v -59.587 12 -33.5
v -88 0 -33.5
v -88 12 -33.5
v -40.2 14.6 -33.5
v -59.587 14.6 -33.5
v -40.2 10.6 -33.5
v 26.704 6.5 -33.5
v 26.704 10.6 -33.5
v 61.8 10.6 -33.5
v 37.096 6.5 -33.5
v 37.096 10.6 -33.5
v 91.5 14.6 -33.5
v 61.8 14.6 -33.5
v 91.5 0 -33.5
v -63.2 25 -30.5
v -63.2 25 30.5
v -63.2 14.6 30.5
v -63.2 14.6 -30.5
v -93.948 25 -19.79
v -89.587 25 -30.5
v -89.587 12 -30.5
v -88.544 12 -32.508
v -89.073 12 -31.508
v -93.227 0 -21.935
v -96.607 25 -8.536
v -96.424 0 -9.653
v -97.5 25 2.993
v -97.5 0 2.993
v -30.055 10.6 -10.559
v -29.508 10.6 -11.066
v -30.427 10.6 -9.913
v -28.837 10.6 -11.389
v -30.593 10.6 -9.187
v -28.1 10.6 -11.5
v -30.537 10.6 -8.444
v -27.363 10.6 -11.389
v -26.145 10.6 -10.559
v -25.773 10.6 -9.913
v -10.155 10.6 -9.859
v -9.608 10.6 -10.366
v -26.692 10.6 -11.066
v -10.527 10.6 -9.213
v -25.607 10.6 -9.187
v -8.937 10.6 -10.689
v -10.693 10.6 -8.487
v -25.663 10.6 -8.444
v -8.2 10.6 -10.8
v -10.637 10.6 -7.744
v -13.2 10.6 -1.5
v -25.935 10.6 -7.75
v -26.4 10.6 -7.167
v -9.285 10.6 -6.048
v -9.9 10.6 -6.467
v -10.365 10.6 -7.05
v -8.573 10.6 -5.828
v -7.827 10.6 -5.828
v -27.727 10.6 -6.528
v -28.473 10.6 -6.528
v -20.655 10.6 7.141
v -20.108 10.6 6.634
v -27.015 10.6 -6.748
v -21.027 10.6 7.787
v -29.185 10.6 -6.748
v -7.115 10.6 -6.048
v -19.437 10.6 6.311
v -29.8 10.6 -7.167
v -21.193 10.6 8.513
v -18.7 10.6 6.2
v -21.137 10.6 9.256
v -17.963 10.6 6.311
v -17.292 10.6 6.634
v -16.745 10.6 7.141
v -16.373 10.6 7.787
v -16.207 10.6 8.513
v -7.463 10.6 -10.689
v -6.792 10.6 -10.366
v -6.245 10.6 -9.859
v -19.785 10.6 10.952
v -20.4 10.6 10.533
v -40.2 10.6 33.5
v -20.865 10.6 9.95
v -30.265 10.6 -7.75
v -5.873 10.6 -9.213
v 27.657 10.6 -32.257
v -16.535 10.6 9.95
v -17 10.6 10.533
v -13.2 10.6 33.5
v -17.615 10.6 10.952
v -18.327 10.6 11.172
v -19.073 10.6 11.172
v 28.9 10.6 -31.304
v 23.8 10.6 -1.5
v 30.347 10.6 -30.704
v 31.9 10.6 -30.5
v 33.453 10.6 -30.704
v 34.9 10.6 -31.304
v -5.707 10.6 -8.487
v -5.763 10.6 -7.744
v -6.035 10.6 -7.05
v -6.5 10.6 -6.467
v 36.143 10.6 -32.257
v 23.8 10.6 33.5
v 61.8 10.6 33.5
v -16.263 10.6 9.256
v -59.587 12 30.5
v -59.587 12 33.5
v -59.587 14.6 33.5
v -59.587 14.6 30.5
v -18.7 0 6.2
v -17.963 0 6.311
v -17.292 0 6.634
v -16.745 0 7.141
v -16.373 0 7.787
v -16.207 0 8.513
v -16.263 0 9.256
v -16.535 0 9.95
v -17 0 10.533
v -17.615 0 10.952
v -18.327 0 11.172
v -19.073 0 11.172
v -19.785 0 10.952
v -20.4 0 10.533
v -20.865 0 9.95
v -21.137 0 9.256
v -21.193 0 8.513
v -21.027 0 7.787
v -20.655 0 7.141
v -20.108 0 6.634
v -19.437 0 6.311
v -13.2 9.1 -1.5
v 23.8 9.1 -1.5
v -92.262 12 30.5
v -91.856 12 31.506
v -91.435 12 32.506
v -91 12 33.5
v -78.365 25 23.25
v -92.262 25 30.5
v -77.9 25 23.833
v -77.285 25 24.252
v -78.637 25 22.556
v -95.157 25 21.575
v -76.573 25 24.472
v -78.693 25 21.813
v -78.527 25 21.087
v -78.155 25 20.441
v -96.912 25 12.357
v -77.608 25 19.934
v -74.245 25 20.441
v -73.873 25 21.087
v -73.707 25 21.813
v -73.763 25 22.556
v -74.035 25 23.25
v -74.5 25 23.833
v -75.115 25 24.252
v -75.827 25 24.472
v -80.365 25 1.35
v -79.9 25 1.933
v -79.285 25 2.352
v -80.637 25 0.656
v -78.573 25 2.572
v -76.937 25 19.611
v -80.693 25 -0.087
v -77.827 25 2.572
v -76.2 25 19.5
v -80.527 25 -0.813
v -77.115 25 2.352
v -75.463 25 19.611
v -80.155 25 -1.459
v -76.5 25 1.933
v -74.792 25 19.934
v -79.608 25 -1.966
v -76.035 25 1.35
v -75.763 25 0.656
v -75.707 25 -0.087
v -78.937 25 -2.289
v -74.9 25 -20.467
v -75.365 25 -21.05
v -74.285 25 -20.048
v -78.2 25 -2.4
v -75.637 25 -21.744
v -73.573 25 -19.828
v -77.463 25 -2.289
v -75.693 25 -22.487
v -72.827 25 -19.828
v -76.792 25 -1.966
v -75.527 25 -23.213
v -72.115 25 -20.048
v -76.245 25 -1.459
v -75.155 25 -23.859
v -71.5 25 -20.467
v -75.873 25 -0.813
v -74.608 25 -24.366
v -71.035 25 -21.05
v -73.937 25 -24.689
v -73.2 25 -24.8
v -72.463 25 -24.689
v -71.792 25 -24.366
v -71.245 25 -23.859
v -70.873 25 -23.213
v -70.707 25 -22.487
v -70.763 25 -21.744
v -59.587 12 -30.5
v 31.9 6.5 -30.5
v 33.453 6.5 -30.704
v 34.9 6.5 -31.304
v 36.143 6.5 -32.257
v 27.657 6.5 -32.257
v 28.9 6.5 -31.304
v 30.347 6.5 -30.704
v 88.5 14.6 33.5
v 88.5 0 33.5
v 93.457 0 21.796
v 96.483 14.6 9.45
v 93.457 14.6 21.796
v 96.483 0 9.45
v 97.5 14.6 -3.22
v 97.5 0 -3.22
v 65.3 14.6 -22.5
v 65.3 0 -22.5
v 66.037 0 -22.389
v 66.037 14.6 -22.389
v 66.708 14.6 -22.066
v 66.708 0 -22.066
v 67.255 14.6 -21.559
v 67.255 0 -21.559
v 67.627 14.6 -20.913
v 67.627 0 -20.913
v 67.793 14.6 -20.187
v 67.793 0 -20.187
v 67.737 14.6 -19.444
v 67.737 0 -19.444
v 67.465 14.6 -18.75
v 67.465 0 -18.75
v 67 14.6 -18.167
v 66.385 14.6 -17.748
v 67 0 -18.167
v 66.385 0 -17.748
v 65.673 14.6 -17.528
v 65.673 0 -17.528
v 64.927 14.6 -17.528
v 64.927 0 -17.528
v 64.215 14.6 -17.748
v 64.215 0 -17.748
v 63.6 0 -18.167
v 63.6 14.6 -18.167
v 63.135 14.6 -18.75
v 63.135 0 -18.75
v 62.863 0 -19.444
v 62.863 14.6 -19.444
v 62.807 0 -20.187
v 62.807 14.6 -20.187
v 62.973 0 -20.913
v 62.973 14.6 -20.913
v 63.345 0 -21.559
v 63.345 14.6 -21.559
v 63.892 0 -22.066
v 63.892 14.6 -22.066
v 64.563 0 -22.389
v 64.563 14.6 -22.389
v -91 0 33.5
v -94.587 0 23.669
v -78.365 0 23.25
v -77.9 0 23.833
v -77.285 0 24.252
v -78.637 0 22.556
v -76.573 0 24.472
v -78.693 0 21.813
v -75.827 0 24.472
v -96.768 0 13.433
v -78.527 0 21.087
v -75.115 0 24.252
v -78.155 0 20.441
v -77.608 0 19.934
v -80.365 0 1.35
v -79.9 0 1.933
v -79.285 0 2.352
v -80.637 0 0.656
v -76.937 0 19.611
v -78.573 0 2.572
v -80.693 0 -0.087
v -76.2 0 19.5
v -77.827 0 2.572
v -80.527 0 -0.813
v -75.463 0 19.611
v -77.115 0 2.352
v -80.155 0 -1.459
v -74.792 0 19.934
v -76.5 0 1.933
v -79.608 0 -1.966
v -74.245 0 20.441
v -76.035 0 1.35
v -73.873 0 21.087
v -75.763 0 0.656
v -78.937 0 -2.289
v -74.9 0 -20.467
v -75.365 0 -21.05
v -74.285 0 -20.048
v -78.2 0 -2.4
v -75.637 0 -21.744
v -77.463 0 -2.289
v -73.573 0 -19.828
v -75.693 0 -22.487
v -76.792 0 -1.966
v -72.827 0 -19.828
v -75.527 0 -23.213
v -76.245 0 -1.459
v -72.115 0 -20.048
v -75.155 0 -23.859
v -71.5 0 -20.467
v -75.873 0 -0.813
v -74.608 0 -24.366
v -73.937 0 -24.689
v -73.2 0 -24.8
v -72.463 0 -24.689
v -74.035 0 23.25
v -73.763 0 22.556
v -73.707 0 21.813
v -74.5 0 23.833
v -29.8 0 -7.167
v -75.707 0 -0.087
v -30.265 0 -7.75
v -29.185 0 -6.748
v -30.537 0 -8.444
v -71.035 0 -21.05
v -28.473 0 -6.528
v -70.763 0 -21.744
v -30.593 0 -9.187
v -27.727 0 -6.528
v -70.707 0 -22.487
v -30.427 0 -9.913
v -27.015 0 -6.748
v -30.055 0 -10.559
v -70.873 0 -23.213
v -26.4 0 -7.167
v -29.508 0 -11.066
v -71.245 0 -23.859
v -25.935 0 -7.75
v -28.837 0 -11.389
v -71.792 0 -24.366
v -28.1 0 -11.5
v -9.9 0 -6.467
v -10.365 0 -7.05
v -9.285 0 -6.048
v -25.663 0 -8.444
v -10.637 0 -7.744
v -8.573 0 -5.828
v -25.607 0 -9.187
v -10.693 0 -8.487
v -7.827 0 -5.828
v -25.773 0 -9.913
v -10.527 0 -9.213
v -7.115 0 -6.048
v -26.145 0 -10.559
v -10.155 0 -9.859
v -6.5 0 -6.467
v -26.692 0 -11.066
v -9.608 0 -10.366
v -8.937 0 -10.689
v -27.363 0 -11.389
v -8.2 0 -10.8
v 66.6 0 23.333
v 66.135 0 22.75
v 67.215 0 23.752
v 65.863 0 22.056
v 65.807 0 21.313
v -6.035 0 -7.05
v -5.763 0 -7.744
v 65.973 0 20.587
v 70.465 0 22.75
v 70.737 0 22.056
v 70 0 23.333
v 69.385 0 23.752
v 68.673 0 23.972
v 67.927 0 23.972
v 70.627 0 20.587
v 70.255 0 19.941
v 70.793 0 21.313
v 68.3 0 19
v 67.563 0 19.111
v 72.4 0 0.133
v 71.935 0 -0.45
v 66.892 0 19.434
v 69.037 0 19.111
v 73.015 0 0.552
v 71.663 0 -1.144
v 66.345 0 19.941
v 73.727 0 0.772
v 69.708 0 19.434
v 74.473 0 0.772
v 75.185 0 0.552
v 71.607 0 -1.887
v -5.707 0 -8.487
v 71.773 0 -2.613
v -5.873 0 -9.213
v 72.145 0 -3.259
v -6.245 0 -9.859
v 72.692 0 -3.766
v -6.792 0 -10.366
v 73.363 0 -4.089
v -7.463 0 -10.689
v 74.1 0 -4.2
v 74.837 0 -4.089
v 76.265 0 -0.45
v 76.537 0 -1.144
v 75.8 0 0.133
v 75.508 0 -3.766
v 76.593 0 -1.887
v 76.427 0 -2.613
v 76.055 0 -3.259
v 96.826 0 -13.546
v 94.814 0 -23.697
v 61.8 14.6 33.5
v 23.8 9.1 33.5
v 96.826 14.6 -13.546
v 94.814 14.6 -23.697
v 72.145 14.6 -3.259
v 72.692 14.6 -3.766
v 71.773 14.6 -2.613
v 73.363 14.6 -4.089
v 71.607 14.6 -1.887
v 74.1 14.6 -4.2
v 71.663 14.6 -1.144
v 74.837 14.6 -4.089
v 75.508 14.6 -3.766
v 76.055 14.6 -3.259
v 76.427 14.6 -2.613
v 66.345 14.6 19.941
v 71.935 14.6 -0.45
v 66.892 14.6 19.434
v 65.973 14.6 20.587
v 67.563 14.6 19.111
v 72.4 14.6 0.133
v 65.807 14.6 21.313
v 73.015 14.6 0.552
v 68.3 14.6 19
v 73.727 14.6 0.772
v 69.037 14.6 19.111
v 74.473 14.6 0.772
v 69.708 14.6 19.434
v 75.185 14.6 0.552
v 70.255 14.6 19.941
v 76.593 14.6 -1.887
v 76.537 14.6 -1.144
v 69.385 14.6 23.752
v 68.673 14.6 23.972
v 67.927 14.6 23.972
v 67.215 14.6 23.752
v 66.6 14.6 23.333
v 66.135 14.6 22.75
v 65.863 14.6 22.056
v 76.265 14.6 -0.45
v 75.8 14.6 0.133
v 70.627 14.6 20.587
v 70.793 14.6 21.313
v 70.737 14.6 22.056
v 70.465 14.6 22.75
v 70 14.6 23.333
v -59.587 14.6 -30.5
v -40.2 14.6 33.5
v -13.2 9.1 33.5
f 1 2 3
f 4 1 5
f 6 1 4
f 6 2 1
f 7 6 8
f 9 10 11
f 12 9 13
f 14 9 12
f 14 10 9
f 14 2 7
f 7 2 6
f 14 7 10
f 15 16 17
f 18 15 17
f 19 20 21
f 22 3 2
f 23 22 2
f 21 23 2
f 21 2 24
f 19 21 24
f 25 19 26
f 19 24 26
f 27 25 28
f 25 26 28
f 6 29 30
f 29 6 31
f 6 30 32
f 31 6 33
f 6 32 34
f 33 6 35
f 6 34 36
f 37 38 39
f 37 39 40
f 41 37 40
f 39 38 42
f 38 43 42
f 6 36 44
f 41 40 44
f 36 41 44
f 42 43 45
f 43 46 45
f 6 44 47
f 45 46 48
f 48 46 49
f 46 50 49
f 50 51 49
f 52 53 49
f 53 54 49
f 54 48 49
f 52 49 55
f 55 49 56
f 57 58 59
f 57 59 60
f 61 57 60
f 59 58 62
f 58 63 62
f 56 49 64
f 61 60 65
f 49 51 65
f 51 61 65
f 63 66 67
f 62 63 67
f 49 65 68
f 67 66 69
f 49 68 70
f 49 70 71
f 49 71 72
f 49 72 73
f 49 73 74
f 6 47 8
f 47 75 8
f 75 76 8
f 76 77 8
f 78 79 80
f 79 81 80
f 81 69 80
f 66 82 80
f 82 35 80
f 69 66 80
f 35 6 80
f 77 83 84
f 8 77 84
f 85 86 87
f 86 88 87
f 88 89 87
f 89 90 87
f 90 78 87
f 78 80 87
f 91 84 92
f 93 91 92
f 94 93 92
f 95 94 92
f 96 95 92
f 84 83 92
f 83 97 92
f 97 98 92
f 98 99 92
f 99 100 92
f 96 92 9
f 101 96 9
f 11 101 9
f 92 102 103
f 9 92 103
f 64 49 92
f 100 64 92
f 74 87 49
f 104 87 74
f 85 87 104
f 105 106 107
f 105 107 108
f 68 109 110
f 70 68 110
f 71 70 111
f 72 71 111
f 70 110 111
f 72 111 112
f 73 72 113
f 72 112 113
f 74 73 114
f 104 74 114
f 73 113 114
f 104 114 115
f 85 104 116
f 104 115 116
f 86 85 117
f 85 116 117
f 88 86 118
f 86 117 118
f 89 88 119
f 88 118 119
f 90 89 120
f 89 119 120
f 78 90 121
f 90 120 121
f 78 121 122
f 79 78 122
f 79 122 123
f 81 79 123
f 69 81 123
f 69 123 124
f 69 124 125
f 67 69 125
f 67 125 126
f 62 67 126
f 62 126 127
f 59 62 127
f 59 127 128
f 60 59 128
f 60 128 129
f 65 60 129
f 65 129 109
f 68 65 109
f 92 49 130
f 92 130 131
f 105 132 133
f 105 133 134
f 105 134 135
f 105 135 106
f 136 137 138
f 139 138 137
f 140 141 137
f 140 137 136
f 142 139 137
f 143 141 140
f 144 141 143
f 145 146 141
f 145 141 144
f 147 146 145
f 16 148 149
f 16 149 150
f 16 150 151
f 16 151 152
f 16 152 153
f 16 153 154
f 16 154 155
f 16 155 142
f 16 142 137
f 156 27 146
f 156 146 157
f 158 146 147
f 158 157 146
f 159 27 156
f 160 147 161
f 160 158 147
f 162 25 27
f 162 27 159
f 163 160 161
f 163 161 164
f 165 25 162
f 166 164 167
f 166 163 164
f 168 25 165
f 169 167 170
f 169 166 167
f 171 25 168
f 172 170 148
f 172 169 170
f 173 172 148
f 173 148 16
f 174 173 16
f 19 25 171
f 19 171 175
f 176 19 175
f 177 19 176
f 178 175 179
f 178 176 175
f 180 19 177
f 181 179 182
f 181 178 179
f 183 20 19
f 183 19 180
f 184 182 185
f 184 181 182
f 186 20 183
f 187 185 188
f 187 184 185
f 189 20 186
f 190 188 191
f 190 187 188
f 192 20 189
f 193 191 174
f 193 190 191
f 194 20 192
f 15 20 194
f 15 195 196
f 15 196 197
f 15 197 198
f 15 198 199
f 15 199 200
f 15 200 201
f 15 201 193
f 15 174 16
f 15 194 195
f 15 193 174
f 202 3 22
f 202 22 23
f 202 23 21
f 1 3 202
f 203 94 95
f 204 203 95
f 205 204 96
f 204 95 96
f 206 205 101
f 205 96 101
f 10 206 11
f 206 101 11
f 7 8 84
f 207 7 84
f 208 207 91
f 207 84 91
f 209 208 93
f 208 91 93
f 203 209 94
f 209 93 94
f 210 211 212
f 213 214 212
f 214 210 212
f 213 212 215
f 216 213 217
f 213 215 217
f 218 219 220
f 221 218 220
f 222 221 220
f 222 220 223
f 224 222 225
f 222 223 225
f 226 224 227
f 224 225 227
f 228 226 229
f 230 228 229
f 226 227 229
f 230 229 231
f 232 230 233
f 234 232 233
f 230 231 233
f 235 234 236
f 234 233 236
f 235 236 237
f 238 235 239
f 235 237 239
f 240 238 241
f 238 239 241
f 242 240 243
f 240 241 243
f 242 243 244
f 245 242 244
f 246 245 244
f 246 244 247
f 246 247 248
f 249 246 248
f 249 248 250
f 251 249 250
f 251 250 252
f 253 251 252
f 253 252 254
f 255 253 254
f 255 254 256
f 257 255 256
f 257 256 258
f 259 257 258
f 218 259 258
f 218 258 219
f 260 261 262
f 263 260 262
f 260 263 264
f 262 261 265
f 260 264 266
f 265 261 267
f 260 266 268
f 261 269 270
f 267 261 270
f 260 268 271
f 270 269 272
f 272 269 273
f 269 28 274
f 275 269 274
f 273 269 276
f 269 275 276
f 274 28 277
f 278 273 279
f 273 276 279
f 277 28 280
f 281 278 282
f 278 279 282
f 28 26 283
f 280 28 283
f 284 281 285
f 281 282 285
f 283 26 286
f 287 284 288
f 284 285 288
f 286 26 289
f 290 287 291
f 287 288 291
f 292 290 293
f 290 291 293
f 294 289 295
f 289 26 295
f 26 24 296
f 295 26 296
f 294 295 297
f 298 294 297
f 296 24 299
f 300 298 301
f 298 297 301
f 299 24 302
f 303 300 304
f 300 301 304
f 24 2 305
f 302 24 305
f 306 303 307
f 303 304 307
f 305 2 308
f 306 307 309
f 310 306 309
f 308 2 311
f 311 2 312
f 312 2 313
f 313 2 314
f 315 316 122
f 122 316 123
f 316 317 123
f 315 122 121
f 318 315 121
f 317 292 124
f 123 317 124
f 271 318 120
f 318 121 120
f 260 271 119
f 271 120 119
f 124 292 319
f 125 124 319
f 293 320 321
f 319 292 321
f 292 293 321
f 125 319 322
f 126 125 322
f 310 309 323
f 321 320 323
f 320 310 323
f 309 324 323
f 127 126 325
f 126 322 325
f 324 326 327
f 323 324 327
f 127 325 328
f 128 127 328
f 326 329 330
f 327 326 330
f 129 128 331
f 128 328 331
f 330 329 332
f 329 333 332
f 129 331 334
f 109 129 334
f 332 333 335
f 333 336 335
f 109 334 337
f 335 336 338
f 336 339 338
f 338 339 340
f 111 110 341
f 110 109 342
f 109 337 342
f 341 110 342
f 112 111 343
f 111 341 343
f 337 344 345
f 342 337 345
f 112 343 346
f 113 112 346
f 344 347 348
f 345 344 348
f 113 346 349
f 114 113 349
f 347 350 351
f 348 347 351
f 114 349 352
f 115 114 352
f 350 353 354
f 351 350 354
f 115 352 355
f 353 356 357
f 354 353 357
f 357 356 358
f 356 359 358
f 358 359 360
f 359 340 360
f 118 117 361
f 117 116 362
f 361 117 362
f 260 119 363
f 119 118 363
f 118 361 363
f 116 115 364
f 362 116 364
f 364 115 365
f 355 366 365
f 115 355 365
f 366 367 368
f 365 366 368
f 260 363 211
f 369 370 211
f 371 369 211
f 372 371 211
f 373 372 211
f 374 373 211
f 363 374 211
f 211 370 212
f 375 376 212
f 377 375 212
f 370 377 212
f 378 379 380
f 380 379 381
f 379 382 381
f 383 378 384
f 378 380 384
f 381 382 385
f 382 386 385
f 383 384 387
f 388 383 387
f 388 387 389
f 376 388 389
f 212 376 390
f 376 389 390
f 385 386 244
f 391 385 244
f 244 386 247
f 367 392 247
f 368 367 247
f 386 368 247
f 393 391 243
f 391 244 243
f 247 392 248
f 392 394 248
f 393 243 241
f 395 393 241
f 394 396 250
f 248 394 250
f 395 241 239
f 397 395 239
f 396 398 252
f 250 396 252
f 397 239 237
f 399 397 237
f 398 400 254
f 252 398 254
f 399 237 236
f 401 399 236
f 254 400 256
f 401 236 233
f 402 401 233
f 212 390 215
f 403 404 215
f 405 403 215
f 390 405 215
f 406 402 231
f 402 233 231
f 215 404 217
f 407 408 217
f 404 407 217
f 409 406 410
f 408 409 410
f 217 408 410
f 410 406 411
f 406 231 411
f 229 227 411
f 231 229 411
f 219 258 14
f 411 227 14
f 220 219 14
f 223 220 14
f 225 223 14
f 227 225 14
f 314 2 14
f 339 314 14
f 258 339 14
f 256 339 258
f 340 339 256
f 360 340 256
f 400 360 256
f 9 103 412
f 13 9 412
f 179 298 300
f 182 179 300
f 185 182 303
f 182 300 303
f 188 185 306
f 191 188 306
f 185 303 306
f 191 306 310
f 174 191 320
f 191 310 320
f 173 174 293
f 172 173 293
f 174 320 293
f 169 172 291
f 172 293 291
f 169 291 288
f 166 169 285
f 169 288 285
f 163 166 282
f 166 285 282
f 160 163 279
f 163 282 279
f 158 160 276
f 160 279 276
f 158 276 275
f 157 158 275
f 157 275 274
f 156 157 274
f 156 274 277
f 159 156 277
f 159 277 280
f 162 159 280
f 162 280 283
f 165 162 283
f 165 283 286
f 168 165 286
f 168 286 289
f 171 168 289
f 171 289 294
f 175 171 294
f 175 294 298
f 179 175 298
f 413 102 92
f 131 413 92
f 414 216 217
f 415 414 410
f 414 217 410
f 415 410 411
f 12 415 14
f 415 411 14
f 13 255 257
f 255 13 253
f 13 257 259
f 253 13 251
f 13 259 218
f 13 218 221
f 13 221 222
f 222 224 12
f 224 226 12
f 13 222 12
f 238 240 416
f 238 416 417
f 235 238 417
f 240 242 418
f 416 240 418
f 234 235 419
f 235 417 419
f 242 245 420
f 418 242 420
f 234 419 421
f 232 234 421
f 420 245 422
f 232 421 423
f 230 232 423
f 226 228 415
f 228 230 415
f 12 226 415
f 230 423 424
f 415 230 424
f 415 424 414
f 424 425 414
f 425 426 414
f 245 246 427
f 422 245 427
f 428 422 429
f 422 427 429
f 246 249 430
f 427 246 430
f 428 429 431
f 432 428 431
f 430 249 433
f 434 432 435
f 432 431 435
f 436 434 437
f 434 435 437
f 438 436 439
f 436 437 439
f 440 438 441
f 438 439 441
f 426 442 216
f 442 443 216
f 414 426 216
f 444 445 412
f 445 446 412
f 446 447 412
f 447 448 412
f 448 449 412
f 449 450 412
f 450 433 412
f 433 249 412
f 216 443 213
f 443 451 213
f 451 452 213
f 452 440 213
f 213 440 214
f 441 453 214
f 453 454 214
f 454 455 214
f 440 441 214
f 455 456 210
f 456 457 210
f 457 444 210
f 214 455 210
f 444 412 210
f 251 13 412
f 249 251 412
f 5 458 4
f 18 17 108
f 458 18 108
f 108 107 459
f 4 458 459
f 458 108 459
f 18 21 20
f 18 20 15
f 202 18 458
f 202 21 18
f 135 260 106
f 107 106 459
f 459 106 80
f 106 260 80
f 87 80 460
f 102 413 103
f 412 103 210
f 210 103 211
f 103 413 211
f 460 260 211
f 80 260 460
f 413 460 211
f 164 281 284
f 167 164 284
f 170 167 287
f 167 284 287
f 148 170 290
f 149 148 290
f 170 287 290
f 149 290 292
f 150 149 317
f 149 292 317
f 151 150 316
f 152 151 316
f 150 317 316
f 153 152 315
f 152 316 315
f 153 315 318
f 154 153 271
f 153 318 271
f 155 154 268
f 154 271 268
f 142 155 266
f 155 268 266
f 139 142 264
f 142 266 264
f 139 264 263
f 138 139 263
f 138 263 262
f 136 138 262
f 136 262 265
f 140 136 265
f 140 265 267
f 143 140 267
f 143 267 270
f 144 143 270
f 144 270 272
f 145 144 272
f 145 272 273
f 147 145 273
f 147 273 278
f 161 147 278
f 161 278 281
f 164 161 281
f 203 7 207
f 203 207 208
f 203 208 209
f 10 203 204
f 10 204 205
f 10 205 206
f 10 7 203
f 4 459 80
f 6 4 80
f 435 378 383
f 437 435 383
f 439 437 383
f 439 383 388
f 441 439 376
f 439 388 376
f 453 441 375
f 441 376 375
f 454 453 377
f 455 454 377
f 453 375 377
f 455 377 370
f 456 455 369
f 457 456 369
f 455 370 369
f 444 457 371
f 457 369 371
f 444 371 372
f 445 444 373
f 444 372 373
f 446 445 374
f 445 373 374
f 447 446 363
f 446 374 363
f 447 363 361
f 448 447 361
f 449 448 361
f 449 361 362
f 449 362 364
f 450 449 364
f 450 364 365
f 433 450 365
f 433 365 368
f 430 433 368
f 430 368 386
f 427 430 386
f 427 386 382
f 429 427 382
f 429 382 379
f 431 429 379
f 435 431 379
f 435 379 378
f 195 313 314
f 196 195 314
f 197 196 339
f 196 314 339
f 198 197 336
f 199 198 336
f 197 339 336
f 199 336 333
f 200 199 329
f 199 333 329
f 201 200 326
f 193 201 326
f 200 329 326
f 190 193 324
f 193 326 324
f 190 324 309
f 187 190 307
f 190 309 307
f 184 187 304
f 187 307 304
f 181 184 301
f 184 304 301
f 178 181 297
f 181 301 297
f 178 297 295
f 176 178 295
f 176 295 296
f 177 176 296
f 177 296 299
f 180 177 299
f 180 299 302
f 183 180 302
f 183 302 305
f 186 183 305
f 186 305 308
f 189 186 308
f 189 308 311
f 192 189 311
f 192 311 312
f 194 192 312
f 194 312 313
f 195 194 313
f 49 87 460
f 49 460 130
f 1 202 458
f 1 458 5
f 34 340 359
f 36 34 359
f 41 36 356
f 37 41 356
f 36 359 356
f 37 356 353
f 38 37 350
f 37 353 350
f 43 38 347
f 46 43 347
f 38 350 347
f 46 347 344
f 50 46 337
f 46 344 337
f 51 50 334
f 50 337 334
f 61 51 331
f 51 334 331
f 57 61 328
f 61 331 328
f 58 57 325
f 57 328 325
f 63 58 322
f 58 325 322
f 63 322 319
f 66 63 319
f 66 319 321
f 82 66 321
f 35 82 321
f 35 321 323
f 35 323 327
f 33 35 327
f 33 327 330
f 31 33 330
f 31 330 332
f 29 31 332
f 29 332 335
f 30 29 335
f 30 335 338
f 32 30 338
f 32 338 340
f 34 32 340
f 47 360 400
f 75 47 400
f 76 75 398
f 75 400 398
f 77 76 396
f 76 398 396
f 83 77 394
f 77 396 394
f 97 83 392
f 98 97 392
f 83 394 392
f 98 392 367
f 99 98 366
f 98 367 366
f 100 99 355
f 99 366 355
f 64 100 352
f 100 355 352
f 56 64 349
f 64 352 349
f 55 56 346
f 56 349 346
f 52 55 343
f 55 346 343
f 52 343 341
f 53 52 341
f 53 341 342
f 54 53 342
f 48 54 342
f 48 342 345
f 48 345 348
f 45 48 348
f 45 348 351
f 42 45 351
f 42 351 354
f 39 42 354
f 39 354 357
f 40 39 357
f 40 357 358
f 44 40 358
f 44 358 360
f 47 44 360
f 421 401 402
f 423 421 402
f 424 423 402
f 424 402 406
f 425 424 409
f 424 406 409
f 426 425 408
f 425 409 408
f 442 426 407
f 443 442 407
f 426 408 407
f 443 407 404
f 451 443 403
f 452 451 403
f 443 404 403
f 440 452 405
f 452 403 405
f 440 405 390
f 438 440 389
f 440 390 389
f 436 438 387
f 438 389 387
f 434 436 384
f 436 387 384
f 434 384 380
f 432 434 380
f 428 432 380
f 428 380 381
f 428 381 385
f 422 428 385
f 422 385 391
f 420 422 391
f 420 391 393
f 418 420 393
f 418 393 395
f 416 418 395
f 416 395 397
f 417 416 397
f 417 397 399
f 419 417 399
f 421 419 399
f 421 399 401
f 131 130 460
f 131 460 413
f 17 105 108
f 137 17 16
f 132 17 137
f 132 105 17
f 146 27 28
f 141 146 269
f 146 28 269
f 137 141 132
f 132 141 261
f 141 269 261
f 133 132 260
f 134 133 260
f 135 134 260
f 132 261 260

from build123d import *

# Parameters (mm, degrees)
SKETCH1_W           = 195
SKETCH1_H           = 67
BOSS_EXTRUDE1_DEPTH = 25
CUT_EXTRUDE1_DEPTH  = 107.082515053
CUT_EXTRUDE2_DEPTH  = 121.914225797
CUT_EXTRUDE3_START  = -13
SKETCH4_W           = 3.612655346
SKETCH4_H           = 3
CUT_EXTRUDE3_DEPTH  = 13
SKETCH6_R           = 2.5
CUT_EXTRUDE4_DEPTH  = 107.082515053
SKETCH7_W           = 37
SKETCH7_H           = 35
CUT_EXTRUDE5_DEPTH  = 1.5
CUT_EXTRUDE6_DEPTH  = 18.5


with BuildPart() as part:
    # Sketch1 → Boss-Extrude1 (new body)
    with BuildSketch(Plane(origin=(0, 0, 0), x_dir=(1, 0, 0), z_dir=(0, 1, 0))):
        Rectangle(SKETCH1_W, SKETCH1_H)
    extrude(amount=BOSS_EXTRUDE1_DEPTH)

    # Sketch2 → Cut-Extrude1 (cut, through all)
    with BuildSketch(Plane.XZ):
        with BuildLine():
            Line((97.5, -3.219751644), (97.5, 33.5))
            Line((97.5, 33.5), (88.5, 33.5))
            ThreePointArc((88.5, 33.5), (95.217186872, 15.683556008), (97.5, -3.219751644))
        make_face()
        with BuildLine():
            Line((97.5, -33.5), (97.5, -3.219751644))
            ThreePointArc((97.5, -3.219751644), (95.985558513, -18.65423771), (91.5, -33.5))
            Line((91.5, -33.5), (97.5, -33.5))
        make_face()
        with BuildLine():
            ThreePointArc((-88, -33.5), (-95.08607052, -15.861694529), (-97.5, 2.992884749))
            Line((-97.5, 2.992884749), (-97.5, -33.5))
            Line((-97.5, -33.5), (-88, -33.5))
        make_face()
        with BuildLine():
            ThreePointArc((-97.5, 2.992884749), (-95.856964648, 18.588830376), (-91, 33.5))
            Line((-91, 33.5), (-97.5, 33.5))
            Line((-97.5, 33.5), (-97.5, 2.992884749))
        make_face()
    extrude(amount=-CUT_EXTRUDE1_DEPTH, mode=Mode.SUBTRACT)

    # Sketch3 → Cut-Extrude2 (cut, through all)
    with BuildSketch(Plane(origin=(0, 0, 33.5), x_dir=(-1, 0, 0), z_dir=(0, 0, -1))):
        Polygon((63.2, 25), (63.2, 14.6), (40.2, 14.6), (40.2, 10.6), (-61.8, 10.6), (-61.8, 14.6), (-97.5, 14.6), (-97.5, 25), align=None)
    extrude(amount=CUT_EXTRUDE2_DEPTH, mode=Mode.SUBTRACT)

    # Sketch4 → Cut-Extrude3 (cut)
    with BuildSketch(Plane(origin=(0, 25, 0), x_dir=(1, 0, 0), z_dir=(0, 1, 0)).offset(CUT_EXTRUDE3_START)):
        with BuildLine():
            Line((-63.2, 30.5), (-63.2, 33.5))
            Line((-63.2, 33.5), (-88, 33.5))
            ThreePointArc((-88, 33.5), (-88.810680862, 32.008999469), (-89.587344654, 30.5))
            Line((-89.587344654, 30.5), (-63.2, 30.5))
        make_face()
        with Locations((-61.393672327, 32)):
            Rectangle(SKETCH4_W, SKETCH4_H)
        with BuildLine():
            Line((-63.2, -33.5), (-63.2, -30.5))
            Line((-63.2, -30.5), (-92.261692194, -30.5))
            ThreePointArc((-92.261692194, -30.5), (-91.647155152, -32.006859002), (-91, -33.5))
            Line((-91, -33.5), (-63.2, -33.5))
        make_face()
        with Locations((-61.393672327, -32)):
            Rectangle(SKETCH4_W, SKETCH4_H)
    extrude(amount=CUT_EXTRUDE3_DEPTH, mode=Mode.SUBTRACT)

    # Sketch6 → Cut-Extrude4 (cut, through all)
    with BuildSketch(Plane.XZ):
        with Locations(Location((-28.1, -9, 0), (0, 0, 270))):
            Circle(SKETCH6_R)
        with Locations(Location((-8.2, -8.3, 0), (0, 0, 270))):
            Circle(SKETCH6_R)
        with Locations(Location((-18.7, 8.7, 0), (0, 0, 270))):
            Circle(SKETCH6_R)
        with Locations(Location((-76.2, 22, 0), (0, 0, 270))):
            Circle(SKETCH6_R)
        with Locations(Location((-78.2, 0.1, 0), (0, 0, 270))):
            Circle(SKETCH6_R)
        with Locations(Location((-73.2, -22.3, 0), (0, 0, 270))):
            Circle(SKETCH6_R)
        with Locations(Location((65.3, -20, 0), (0, 0, 270))):
            Circle(SKETCH6_R)
        with Locations(Location((74.1, -1.7, 0), (0, 0, 270))):
            Circle(SKETCH6_R)
        with Locations(Location((68.3, 21.5, 0), (0, 0, 270))):
            Circle(SKETCH6_R)
    extrude(amount=-CUT_EXTRUDE4_DEPTH, mode=Mode.SUBTRACT)

    # Sketch7 → Cut-Extrude5 (cut)
    with BuildSketch(Plane(origin=(0, 10.6, 0), x_dir=(1, 0, 0), z_dir=(0, 1, 0))):
        with Locations((5.3, -16)):
            Rectangle(SKETCH7_W, SKETCH7_H)
    extrude(amount=-CUT_EXTRUDE5_DEPTH, mode=Mode.SUBTRACT)

    # Sketch8 → Cut-Extrude6 (cut)
    with BuildSketch(Plane(origin=(0, 25, 0), x_dir=(1, 0, 0), z_dir=(0, 1, 0))):
        with BuildLine():
            Line((37.096152423, 33.5), (31.9, 33.5))
            Line((31.9, 33.5), (31.9, 30.5))
            ThreePointArc((31.9, 30.5), (34.9, 31.303847577), (37.096152423, 33.5))
        make_face()
        with BuildLine():
            Line((31.9, 33.5), (26.703847577, 33.5))
            ThreePointArc((26.703847577, 33.5), (28.9, 31.303847577), (31.9, 30.5))
            Line((31.9, 30.5), (31.9, 33.5))
        make_face()
    extrude(amount=-CUT_EXTRUDE6_DEPTH, mode=Mode.SUBTRACT)


solid = part.part
